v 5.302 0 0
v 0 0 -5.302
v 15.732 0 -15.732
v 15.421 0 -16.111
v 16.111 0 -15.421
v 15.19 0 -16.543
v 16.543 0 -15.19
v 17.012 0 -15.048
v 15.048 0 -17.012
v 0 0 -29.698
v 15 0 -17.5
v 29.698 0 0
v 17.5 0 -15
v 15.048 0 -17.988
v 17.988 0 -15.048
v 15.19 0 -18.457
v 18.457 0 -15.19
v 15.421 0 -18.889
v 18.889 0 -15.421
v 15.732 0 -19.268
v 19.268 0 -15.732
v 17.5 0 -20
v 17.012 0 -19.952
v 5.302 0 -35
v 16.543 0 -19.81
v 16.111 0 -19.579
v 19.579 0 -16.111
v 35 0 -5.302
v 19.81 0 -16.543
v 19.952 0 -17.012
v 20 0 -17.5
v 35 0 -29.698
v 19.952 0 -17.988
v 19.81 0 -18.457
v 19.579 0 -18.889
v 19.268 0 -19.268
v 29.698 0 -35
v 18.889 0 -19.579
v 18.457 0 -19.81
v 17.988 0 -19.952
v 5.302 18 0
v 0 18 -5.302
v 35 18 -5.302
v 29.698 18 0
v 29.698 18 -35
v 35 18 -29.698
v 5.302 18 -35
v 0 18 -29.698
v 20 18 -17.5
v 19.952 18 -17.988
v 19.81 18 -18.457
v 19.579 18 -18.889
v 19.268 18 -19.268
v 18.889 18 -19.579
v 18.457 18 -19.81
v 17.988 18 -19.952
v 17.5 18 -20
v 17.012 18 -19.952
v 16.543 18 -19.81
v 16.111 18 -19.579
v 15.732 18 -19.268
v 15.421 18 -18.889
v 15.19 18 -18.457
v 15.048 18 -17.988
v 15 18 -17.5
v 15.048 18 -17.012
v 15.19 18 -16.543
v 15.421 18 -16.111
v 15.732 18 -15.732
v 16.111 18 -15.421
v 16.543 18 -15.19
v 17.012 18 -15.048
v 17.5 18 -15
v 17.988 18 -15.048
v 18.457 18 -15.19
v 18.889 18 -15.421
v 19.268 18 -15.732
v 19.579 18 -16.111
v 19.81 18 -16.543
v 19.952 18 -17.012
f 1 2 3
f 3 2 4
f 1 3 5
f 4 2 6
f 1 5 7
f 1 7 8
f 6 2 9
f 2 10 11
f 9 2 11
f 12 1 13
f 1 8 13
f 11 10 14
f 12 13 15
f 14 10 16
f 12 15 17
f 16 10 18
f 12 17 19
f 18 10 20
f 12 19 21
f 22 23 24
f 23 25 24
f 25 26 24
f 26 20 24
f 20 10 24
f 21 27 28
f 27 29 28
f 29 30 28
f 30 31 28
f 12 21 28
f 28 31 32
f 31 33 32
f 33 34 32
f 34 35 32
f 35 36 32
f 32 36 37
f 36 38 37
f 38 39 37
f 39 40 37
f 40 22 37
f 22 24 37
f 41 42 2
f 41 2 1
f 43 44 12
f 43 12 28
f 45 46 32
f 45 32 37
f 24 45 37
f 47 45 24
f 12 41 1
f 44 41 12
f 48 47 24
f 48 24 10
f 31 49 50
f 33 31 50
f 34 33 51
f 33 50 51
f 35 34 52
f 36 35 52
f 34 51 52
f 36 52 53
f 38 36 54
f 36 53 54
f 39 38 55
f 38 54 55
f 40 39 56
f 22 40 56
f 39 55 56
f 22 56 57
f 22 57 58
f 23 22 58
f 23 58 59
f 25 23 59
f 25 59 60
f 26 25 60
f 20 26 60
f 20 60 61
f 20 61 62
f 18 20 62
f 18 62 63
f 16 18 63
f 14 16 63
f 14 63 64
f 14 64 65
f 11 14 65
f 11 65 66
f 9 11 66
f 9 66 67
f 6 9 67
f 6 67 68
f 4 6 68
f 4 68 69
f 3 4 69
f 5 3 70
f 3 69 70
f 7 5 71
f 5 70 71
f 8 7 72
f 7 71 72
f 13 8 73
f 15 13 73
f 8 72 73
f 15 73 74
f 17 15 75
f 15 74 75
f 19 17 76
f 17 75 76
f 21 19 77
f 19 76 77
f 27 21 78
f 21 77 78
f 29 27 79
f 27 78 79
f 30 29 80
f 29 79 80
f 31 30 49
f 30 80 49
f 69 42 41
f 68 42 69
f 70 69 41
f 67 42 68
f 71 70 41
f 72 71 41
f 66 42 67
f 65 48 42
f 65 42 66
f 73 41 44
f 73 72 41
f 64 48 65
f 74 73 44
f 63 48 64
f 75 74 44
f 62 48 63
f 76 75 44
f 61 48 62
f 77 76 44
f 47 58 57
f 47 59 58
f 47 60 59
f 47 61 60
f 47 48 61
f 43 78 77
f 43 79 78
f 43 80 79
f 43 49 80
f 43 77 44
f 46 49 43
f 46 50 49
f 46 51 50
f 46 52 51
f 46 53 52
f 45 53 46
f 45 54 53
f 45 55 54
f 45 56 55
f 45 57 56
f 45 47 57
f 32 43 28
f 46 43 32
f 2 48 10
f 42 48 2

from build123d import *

# Parameters (mm, degrees)
CROQUIS1_W              = 35
CROQUIS1_H              = 35
SALIENTE_EXTRUIR1_DEPTH = 18
CROQUIS2_OUTSIDE_W      = 47.534
CROQUIS2_OUTSIDE_H      = 47.534
CORTAR_EXTRUIR2_DEPTH   = 18
CROQUIS3_R              = 2.5
CORTAR_EXTRUIR3_DEPTH   = 19


with BuildPart() as part:
    # Croquis1 → Saliente-Extruir1 (new body)
    with BuildSketch(Plane(origin=(0, 0, 0), x_dir=(1, 0, 0), z_dir=(0, 1, 0))):
        with Locations((17.5, 17.5)):
            Rectangle(CROQUIS1_W, CROQUIS1_H)
    extrude(amount=SALIENTE_EXTRUIR1_DEPTH)

    # Croquis2 outside → Cortar-Extruir2 (cut)
    with BuildSketch(Plane(origin=(0, 18, 0), x_dir=(1, 0, 0), z_dir=(0, 1, 0))):
        with Locations((17.5, 17.5)):
            Rectangle(CROQUIS2_OUTSIDE_W, CROQUIS2_OUTSIDE_H)
        Polygon((5.30151519, 35), (0, 29.69848481), (0, 5.30151519), (5.30151519, 0), (29.69848481, 0), (35, 5.30151519), (35, 29.69848481), (29.69848481, 35), align=None, mode=Mode.SUBTRACT)
    extrude(amount=-CORTAR_EXTRUIR2_DEPTH, mode=Mode.SUBTRACT)

    # Croquis3 → Cortar-Extruir3 (cut, through all)
    with BuildSketch(Plane(origin=(0, 18, 0), x_dir=(1, 0, 0), z_dir=(0, 1, 0))):
        with Locations((17.5, 17.5)):
            Circle(CROQUIS3_R)
    extrude(amount=-CORTAR_EXTRUIR3_DEPTH, mode=Mode.SUBTRACT)


solid = part.part
